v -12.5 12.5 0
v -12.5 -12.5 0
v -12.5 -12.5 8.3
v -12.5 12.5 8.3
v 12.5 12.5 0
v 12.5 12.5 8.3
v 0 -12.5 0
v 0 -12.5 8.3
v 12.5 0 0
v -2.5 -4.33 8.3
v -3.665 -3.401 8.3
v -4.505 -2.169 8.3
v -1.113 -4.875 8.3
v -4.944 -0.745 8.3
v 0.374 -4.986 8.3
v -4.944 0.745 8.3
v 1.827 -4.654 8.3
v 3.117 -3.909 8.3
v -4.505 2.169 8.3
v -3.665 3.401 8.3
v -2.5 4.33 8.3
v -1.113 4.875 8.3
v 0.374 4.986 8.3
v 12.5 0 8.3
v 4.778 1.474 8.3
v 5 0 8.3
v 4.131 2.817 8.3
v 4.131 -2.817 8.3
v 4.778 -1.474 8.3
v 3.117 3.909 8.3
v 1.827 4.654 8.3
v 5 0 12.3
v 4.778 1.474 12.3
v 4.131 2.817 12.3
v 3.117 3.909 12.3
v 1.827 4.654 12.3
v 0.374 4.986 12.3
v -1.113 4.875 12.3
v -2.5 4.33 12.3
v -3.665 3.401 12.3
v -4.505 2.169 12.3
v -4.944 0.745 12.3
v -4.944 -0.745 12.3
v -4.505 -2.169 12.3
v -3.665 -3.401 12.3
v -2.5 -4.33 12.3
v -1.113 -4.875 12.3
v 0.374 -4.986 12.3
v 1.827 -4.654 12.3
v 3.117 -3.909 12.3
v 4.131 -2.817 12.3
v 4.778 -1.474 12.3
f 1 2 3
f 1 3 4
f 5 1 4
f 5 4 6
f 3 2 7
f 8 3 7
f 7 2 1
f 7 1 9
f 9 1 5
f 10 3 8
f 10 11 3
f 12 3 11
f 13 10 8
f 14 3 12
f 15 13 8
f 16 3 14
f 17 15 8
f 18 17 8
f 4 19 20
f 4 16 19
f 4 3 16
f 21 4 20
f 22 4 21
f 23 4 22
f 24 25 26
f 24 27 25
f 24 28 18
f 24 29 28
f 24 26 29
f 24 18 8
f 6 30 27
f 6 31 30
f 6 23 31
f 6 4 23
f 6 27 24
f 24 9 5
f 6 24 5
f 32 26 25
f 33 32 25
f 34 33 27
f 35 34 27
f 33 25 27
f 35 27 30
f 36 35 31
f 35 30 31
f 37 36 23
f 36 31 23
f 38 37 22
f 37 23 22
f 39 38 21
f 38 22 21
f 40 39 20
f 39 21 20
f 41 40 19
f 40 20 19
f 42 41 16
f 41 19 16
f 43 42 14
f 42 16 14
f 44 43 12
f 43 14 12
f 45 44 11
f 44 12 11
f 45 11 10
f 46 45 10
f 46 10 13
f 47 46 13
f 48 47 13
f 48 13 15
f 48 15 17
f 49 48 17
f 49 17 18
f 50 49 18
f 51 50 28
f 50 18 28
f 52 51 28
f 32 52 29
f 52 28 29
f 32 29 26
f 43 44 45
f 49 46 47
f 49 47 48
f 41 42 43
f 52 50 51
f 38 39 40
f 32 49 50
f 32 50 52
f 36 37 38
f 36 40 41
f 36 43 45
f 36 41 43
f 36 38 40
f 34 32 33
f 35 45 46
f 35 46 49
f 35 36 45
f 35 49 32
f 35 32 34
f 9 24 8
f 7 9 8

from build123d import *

# Parameters (mm, degrees)
F0_W     = 25
F0_H     = 25
F1_DEPTH = 8.3
F2_R     = 5
F3_DEPTH = 4
F5_DEPTH = 25


with BuildPart() as f1:
    # F0 (on Top) → F1 (new body)
    with BuildSketch(Plane.XY):
        Rectangle(F0_W, F0_H)
    extrude(amount=F1_DEPTH)

    # F2 (on face) → F3 (join)
    with BuildSketch(Plane.XY.offset(8.3)):
        Circle(F2_R)
    extrude(amount=F3_DEPTH)

    # F4 (on face) → F5 (cut)
    with BuildSketch(Plane.XY.offset(8.3)):
        Polygon((12.5, -12.5), (12.5, 0), (0, -12.5), align=None)
    extrude(amount=-F5_DEPTH, mode=Mode.SUBTRACT)


solid = f1.part
